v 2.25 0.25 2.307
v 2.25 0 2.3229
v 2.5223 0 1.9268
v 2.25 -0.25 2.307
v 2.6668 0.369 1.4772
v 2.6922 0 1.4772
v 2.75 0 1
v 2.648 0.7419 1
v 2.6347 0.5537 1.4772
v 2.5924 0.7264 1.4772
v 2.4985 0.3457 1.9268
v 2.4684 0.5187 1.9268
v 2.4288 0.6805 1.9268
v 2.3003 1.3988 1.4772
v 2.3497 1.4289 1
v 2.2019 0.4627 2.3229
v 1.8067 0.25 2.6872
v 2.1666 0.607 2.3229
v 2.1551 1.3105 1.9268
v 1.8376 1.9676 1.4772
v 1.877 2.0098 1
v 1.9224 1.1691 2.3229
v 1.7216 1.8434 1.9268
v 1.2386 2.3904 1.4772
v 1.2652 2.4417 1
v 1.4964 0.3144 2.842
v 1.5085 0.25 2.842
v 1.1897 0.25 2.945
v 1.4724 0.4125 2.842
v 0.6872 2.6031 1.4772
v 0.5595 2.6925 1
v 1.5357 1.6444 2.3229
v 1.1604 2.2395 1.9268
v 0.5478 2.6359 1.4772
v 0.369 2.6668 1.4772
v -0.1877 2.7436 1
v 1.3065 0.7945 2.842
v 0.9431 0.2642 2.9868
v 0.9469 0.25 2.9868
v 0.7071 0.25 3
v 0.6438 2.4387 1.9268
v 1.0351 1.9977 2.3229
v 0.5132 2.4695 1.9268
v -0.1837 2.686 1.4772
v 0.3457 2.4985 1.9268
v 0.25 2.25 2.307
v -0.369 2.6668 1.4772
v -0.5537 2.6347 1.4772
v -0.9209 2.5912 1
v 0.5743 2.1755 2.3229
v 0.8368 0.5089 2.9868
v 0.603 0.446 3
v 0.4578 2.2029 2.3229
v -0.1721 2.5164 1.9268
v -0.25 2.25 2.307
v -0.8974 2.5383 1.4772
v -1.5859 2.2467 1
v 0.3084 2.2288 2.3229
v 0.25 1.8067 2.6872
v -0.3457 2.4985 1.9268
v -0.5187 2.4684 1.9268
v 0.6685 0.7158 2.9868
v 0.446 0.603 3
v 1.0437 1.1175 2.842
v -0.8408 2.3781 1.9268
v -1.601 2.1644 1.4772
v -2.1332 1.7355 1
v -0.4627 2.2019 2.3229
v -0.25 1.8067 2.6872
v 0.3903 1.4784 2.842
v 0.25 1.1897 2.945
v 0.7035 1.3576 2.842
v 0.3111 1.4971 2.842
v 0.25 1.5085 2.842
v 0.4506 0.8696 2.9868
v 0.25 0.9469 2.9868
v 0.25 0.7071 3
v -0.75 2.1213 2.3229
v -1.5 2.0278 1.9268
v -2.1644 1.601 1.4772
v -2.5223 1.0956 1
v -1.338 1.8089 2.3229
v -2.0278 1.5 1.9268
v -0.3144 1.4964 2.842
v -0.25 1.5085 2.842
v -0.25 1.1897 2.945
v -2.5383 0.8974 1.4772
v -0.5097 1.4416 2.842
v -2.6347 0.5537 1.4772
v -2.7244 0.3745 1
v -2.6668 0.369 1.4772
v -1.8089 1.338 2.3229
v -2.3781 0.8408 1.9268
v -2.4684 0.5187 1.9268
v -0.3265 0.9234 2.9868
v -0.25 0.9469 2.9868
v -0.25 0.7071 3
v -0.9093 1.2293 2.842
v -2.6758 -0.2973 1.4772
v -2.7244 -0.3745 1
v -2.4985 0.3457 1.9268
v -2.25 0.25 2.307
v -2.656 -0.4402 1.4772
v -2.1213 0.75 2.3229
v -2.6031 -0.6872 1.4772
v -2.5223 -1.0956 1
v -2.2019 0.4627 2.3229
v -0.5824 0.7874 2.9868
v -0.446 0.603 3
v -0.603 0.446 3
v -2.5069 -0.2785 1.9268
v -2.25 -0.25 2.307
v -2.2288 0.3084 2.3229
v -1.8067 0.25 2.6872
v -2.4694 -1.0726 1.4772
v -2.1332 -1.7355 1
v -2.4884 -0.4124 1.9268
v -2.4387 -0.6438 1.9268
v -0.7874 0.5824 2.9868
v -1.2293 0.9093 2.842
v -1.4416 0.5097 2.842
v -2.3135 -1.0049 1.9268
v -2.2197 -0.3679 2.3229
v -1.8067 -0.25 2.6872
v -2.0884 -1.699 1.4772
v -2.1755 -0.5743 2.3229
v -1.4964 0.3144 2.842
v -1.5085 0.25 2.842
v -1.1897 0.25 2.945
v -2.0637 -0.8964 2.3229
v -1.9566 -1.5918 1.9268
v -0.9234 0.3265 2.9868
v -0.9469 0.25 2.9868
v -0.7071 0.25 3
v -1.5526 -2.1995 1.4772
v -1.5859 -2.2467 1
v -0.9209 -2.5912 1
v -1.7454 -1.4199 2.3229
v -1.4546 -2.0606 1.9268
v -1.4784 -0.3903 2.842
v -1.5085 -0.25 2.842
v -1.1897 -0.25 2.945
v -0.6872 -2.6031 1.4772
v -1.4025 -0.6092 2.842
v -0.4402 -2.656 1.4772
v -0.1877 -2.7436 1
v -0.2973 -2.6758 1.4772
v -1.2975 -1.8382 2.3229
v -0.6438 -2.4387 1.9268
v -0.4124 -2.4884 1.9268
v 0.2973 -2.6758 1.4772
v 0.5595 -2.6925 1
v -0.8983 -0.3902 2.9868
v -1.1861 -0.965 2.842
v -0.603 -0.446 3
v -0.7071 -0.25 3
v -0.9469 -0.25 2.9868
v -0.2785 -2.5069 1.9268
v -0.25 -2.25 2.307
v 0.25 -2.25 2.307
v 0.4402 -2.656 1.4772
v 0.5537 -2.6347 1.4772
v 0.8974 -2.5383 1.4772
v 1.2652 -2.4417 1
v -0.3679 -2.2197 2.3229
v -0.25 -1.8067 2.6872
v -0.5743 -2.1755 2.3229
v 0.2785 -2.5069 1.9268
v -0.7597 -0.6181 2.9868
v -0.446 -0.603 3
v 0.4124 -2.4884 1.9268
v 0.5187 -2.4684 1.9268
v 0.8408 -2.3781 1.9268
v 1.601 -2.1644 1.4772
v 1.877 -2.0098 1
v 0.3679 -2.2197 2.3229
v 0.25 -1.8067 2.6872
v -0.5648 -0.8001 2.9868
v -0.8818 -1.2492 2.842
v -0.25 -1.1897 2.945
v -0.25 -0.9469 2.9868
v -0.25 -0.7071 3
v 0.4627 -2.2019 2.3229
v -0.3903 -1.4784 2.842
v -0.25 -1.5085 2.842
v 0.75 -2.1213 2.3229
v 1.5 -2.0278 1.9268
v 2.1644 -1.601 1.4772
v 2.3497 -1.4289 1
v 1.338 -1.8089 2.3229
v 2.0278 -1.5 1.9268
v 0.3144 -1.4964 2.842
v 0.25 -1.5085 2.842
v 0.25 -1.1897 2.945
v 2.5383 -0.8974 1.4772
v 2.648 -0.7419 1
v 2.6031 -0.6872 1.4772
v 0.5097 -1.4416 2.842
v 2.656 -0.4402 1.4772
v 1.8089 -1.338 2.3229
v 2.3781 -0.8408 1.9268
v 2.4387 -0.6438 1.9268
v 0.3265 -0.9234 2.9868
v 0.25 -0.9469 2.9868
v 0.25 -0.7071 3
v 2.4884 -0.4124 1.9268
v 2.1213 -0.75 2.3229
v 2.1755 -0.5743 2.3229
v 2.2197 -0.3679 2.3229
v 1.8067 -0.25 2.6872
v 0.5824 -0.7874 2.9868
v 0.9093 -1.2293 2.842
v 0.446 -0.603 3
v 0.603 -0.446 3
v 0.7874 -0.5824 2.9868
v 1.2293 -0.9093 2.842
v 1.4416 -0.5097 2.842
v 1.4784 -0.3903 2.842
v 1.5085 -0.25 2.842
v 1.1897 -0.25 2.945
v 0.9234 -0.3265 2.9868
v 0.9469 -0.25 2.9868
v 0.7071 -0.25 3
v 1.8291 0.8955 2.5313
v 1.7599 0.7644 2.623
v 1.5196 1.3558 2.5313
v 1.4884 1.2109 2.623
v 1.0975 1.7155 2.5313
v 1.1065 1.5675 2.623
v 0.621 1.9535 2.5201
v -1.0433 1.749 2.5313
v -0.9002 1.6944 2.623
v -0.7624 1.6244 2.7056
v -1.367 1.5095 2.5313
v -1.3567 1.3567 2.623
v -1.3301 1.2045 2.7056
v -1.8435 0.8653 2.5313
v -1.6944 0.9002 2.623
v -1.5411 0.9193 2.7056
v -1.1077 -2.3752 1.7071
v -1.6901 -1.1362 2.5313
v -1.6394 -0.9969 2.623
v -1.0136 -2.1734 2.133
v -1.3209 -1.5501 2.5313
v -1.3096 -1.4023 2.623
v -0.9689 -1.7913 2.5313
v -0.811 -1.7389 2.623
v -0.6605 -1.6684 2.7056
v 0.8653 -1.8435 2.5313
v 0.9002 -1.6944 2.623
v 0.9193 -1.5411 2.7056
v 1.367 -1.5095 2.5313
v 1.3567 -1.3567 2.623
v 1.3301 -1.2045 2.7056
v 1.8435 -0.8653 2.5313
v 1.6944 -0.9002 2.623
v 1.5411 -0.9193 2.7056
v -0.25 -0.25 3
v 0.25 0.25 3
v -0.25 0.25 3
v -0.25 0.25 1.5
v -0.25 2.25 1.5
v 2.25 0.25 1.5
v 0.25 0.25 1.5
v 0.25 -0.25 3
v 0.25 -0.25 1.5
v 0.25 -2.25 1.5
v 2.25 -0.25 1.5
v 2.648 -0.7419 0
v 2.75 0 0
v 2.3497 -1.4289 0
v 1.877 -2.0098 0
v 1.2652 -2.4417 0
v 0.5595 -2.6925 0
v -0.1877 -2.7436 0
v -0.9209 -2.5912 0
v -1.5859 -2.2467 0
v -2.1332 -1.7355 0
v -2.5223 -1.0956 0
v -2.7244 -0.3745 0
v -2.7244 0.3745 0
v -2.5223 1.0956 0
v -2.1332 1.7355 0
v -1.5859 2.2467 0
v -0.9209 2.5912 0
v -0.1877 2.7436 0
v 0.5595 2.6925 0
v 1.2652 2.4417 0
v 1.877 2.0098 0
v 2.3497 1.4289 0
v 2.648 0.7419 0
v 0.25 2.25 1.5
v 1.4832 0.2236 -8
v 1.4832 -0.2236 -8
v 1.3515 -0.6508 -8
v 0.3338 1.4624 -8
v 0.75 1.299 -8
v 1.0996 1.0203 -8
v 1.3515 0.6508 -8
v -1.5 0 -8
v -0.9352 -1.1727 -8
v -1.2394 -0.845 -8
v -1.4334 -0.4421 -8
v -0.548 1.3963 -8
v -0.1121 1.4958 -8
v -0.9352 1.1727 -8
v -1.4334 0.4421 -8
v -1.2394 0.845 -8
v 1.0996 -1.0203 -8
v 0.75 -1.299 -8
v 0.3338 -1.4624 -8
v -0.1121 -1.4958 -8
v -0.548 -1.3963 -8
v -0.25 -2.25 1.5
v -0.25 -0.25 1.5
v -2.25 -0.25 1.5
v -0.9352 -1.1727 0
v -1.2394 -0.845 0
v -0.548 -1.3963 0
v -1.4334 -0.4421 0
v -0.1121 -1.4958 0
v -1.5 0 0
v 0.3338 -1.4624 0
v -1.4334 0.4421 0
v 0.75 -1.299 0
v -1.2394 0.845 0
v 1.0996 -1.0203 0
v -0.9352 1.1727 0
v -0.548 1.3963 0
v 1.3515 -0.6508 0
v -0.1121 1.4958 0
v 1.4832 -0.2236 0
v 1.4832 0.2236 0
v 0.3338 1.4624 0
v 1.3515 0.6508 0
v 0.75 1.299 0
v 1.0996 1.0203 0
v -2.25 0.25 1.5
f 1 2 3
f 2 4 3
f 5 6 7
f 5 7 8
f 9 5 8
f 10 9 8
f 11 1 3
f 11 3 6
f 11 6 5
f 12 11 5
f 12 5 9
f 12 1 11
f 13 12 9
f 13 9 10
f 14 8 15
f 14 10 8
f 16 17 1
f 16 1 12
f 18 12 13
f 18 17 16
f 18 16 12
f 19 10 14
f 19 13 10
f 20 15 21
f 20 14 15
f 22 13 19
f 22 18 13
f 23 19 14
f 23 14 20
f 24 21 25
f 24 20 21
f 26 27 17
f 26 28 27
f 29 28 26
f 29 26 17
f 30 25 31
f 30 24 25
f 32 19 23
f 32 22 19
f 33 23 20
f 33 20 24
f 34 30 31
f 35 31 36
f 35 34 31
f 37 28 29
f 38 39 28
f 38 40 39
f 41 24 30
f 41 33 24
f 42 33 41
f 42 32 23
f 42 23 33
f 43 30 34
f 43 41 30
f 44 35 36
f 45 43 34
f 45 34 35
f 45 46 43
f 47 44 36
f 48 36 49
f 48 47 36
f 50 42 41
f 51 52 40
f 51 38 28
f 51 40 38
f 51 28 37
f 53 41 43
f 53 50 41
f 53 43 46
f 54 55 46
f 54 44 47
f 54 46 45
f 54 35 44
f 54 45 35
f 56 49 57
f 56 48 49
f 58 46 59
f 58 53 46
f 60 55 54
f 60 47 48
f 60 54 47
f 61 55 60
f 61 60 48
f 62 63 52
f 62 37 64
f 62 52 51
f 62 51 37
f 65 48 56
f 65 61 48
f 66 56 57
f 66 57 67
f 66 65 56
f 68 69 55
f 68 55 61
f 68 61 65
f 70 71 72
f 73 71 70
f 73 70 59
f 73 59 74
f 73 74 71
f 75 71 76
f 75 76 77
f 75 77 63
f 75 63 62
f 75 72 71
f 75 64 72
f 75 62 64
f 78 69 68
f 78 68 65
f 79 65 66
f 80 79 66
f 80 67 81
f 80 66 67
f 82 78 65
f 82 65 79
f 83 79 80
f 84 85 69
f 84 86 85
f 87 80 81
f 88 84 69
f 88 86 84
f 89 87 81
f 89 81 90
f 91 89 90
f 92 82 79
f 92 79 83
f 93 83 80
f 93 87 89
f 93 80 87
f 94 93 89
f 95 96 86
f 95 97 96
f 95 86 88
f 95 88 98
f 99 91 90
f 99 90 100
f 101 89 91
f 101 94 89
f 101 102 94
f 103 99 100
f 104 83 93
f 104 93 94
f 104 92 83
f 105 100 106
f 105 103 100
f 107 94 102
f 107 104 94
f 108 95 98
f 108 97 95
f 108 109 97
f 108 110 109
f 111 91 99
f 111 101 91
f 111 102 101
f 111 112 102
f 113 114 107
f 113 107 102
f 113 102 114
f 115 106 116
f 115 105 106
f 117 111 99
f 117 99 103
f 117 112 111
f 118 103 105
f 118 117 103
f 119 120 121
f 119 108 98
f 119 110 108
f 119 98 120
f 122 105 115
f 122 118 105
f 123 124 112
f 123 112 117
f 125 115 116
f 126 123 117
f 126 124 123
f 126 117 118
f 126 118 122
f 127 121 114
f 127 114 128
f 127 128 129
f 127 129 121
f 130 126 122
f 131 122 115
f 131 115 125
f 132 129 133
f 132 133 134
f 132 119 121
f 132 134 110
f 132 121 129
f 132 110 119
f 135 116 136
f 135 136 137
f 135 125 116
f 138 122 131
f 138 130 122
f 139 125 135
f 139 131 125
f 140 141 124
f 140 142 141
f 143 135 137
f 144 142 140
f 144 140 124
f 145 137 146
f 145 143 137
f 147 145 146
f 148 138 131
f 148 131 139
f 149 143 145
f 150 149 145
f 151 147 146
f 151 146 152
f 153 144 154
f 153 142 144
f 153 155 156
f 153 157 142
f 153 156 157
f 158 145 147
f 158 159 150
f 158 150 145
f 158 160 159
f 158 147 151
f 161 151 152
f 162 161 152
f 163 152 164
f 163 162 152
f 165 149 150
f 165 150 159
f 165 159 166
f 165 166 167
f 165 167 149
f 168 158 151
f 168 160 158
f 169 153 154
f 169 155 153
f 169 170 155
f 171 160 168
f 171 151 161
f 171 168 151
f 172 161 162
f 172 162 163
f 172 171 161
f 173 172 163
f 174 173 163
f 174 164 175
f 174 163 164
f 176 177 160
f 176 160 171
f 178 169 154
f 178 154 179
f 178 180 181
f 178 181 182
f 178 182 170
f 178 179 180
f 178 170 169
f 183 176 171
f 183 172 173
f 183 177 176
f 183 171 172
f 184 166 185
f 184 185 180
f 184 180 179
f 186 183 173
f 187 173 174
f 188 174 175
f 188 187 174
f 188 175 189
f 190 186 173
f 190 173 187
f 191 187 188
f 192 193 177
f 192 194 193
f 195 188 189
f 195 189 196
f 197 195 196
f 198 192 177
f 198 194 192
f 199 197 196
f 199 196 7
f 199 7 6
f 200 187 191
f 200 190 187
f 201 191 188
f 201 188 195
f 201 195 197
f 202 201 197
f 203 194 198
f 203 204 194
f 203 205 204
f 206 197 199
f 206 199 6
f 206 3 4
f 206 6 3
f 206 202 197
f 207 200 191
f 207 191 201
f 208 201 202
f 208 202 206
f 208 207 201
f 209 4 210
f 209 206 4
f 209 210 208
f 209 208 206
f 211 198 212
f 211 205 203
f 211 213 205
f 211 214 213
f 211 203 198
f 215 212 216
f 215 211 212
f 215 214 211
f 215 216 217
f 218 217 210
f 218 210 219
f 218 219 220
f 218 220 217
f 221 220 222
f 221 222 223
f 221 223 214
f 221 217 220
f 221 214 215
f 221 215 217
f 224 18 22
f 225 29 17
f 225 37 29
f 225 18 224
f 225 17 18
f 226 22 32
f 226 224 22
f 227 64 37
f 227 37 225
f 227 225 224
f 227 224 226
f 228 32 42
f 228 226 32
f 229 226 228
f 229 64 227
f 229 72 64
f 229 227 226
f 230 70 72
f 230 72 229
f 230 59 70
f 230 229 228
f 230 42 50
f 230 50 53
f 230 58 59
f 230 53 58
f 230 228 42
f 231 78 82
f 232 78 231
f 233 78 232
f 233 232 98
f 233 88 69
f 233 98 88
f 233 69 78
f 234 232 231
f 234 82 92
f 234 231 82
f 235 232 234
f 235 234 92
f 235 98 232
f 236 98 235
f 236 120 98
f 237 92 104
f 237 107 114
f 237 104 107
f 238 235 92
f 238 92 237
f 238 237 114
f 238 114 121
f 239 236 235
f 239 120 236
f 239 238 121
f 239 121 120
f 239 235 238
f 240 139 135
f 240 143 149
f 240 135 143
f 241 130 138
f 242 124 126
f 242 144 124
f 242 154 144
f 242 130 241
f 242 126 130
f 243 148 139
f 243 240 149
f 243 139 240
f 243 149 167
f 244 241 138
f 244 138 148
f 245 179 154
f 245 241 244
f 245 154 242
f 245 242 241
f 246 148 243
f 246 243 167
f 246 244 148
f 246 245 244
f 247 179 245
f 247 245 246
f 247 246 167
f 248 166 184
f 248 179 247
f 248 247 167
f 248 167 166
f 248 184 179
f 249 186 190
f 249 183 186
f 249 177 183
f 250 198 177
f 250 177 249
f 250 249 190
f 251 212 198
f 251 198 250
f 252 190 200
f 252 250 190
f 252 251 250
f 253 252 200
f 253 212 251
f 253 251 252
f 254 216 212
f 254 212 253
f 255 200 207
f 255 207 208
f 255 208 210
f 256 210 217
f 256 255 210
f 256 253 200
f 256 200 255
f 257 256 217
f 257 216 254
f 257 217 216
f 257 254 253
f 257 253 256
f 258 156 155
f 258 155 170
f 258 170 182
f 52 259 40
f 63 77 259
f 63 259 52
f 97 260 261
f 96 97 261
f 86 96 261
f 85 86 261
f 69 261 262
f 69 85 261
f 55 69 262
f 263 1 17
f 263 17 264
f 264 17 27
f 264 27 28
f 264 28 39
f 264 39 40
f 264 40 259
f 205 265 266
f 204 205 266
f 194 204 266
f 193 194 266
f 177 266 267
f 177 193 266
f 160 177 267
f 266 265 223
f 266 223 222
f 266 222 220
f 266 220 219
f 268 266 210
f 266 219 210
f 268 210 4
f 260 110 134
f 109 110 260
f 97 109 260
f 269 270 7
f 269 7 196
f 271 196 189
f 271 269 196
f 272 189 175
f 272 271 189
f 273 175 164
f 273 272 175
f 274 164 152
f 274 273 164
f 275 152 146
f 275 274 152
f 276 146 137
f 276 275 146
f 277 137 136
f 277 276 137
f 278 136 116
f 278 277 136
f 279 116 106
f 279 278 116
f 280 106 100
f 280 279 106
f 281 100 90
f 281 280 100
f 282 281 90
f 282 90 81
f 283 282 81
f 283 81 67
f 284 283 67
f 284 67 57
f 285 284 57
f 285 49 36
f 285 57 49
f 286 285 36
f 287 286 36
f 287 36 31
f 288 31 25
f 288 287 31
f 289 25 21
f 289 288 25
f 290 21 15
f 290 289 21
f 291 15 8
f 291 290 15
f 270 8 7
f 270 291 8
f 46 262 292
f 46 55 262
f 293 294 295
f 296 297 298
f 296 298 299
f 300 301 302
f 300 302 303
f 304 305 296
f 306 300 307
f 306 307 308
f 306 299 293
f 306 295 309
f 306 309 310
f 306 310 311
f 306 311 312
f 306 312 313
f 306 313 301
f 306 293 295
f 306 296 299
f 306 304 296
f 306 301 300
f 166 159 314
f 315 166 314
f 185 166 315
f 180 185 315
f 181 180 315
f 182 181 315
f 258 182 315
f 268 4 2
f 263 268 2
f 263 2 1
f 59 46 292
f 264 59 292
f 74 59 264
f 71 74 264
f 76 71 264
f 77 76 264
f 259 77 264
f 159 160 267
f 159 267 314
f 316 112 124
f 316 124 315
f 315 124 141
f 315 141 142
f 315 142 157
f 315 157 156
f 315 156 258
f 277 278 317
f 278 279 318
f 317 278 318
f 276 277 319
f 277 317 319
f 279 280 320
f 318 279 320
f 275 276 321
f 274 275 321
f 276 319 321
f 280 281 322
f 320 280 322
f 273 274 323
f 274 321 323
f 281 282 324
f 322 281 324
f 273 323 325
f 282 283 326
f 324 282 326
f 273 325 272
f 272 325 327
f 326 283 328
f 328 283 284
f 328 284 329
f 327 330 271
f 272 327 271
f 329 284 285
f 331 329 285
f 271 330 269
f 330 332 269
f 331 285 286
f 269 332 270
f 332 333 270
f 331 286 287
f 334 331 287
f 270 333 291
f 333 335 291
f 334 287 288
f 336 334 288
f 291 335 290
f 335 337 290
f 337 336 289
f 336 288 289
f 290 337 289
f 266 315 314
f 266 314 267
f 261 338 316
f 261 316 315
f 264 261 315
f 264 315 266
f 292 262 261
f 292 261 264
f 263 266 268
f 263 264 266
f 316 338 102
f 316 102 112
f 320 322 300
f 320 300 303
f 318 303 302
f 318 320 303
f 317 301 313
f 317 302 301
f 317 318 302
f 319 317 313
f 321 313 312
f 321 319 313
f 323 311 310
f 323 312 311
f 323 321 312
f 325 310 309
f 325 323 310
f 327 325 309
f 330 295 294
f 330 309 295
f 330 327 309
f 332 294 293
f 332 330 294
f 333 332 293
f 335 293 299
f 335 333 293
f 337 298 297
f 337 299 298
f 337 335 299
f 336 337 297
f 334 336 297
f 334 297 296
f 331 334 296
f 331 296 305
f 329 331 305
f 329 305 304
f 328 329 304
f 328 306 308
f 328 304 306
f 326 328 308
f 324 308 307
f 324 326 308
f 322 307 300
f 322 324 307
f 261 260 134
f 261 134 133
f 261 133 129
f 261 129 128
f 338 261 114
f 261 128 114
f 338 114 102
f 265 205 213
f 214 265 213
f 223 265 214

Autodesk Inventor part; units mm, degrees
ref_plane "YZ Plane" through (0, 0, 0) normal (1, 0, 0) x (0, 1, 0)
ref_plane "XZ Plane" through (0, 0, 0) normal (0, 1, 0) x (-1, 0, 0)
ref_plane "XY Plane" through (0, 0, 0) normal (0, 0, 1) x (1, 0, 0)
sketch "Skizze1" plane through (0, 0, 0) normal (0, 0, 1) x (1, 0, 0)
  circle A0 centre (0, 0) radius 2.75
  dimension "d0" = 5.5
extrude "Extrusion1" add sketch "Skizze1" along normal blind 3
fillet "Rundung1" radius 2 1 edges at (-2.75, 0, 3)
sketch "Skizze2" plane through (0, 0, 3) normal (0, 0, 1) x (1, 0, 0)
  line L0 (0.25, -2.25) -> (-0.25, -2.25)
  line L1 (-0.25, 2.25) -> (0.25, 2.25)
  line L2 (0.25, -2.25) -> (-0.25, 2.25) construction
  line L3 (-0.25, -2.25) -> (0.25, 2.25) construction
  line L4 (-2.25, 0.25) -> (-2.25, -0.25)
  line L5 (2.25, -0.25) -> (2.25, 0.25)
  line L6 (2.25, 0.25) -> (-2.25, -0.25) construction
  line L7 (-2.25, 0.25) -> (2.25, -0.25) construction
  line L8 (-0.25, 0.25) -> (-2.25, 0.25)
  line L9 (-0.25, 0.25) -> (-0.25, 2.25)
  line L10 (-0.25, -2.25) -> (-0.25, -0.25)
  line L11 (-0.25, -0.0278) -> (-0.25, 0.0278)
  line L12 (2.25, 0.25) -> (0.25, 0.25)
  line L13 (0.0278, 0.25) -> (-0.0278, 0.25)
  line L14 (0.25, -0.25) -> (2.25, -0.25)
  line L15 (-2.25, -0.25) -> (-0.25, -0.25)
  line L16 (-0.0278, -0.25) -> (0.0278, -0.25)
  line L17 (0.25, -0.25) -> (0.25, -2.25)
  line L18 (0.25, 2.25) -> (0.25, 0.25)
  line L19 (0.25, 0.0278) -> (0.25, -0.0278)
  point P0 (0, 0)
  dimension "d4" = 0.5
  dimension "d5" = 4.5
  dimension "d6" = 4.5
  dimension "d7" = 0.5
extrude "Extrusion2" cut sketch "Skizze2" against normal blind 1.5
sketch "Skizze3" plane through (0, 0, 0) normal (0, 0, -1) x (-1, 0, 0)
  circle A0 centre (0, 0) radius 1.5
  dimension "d10" = 3
extrude "Extrusion3" add sketch "Skizze3" along normal blind 8
thread "Gewinde1" size "M3x0.5" class "6g" standard "ANSI Metric M Profile" full length
properties part number "M3 Schraube"
